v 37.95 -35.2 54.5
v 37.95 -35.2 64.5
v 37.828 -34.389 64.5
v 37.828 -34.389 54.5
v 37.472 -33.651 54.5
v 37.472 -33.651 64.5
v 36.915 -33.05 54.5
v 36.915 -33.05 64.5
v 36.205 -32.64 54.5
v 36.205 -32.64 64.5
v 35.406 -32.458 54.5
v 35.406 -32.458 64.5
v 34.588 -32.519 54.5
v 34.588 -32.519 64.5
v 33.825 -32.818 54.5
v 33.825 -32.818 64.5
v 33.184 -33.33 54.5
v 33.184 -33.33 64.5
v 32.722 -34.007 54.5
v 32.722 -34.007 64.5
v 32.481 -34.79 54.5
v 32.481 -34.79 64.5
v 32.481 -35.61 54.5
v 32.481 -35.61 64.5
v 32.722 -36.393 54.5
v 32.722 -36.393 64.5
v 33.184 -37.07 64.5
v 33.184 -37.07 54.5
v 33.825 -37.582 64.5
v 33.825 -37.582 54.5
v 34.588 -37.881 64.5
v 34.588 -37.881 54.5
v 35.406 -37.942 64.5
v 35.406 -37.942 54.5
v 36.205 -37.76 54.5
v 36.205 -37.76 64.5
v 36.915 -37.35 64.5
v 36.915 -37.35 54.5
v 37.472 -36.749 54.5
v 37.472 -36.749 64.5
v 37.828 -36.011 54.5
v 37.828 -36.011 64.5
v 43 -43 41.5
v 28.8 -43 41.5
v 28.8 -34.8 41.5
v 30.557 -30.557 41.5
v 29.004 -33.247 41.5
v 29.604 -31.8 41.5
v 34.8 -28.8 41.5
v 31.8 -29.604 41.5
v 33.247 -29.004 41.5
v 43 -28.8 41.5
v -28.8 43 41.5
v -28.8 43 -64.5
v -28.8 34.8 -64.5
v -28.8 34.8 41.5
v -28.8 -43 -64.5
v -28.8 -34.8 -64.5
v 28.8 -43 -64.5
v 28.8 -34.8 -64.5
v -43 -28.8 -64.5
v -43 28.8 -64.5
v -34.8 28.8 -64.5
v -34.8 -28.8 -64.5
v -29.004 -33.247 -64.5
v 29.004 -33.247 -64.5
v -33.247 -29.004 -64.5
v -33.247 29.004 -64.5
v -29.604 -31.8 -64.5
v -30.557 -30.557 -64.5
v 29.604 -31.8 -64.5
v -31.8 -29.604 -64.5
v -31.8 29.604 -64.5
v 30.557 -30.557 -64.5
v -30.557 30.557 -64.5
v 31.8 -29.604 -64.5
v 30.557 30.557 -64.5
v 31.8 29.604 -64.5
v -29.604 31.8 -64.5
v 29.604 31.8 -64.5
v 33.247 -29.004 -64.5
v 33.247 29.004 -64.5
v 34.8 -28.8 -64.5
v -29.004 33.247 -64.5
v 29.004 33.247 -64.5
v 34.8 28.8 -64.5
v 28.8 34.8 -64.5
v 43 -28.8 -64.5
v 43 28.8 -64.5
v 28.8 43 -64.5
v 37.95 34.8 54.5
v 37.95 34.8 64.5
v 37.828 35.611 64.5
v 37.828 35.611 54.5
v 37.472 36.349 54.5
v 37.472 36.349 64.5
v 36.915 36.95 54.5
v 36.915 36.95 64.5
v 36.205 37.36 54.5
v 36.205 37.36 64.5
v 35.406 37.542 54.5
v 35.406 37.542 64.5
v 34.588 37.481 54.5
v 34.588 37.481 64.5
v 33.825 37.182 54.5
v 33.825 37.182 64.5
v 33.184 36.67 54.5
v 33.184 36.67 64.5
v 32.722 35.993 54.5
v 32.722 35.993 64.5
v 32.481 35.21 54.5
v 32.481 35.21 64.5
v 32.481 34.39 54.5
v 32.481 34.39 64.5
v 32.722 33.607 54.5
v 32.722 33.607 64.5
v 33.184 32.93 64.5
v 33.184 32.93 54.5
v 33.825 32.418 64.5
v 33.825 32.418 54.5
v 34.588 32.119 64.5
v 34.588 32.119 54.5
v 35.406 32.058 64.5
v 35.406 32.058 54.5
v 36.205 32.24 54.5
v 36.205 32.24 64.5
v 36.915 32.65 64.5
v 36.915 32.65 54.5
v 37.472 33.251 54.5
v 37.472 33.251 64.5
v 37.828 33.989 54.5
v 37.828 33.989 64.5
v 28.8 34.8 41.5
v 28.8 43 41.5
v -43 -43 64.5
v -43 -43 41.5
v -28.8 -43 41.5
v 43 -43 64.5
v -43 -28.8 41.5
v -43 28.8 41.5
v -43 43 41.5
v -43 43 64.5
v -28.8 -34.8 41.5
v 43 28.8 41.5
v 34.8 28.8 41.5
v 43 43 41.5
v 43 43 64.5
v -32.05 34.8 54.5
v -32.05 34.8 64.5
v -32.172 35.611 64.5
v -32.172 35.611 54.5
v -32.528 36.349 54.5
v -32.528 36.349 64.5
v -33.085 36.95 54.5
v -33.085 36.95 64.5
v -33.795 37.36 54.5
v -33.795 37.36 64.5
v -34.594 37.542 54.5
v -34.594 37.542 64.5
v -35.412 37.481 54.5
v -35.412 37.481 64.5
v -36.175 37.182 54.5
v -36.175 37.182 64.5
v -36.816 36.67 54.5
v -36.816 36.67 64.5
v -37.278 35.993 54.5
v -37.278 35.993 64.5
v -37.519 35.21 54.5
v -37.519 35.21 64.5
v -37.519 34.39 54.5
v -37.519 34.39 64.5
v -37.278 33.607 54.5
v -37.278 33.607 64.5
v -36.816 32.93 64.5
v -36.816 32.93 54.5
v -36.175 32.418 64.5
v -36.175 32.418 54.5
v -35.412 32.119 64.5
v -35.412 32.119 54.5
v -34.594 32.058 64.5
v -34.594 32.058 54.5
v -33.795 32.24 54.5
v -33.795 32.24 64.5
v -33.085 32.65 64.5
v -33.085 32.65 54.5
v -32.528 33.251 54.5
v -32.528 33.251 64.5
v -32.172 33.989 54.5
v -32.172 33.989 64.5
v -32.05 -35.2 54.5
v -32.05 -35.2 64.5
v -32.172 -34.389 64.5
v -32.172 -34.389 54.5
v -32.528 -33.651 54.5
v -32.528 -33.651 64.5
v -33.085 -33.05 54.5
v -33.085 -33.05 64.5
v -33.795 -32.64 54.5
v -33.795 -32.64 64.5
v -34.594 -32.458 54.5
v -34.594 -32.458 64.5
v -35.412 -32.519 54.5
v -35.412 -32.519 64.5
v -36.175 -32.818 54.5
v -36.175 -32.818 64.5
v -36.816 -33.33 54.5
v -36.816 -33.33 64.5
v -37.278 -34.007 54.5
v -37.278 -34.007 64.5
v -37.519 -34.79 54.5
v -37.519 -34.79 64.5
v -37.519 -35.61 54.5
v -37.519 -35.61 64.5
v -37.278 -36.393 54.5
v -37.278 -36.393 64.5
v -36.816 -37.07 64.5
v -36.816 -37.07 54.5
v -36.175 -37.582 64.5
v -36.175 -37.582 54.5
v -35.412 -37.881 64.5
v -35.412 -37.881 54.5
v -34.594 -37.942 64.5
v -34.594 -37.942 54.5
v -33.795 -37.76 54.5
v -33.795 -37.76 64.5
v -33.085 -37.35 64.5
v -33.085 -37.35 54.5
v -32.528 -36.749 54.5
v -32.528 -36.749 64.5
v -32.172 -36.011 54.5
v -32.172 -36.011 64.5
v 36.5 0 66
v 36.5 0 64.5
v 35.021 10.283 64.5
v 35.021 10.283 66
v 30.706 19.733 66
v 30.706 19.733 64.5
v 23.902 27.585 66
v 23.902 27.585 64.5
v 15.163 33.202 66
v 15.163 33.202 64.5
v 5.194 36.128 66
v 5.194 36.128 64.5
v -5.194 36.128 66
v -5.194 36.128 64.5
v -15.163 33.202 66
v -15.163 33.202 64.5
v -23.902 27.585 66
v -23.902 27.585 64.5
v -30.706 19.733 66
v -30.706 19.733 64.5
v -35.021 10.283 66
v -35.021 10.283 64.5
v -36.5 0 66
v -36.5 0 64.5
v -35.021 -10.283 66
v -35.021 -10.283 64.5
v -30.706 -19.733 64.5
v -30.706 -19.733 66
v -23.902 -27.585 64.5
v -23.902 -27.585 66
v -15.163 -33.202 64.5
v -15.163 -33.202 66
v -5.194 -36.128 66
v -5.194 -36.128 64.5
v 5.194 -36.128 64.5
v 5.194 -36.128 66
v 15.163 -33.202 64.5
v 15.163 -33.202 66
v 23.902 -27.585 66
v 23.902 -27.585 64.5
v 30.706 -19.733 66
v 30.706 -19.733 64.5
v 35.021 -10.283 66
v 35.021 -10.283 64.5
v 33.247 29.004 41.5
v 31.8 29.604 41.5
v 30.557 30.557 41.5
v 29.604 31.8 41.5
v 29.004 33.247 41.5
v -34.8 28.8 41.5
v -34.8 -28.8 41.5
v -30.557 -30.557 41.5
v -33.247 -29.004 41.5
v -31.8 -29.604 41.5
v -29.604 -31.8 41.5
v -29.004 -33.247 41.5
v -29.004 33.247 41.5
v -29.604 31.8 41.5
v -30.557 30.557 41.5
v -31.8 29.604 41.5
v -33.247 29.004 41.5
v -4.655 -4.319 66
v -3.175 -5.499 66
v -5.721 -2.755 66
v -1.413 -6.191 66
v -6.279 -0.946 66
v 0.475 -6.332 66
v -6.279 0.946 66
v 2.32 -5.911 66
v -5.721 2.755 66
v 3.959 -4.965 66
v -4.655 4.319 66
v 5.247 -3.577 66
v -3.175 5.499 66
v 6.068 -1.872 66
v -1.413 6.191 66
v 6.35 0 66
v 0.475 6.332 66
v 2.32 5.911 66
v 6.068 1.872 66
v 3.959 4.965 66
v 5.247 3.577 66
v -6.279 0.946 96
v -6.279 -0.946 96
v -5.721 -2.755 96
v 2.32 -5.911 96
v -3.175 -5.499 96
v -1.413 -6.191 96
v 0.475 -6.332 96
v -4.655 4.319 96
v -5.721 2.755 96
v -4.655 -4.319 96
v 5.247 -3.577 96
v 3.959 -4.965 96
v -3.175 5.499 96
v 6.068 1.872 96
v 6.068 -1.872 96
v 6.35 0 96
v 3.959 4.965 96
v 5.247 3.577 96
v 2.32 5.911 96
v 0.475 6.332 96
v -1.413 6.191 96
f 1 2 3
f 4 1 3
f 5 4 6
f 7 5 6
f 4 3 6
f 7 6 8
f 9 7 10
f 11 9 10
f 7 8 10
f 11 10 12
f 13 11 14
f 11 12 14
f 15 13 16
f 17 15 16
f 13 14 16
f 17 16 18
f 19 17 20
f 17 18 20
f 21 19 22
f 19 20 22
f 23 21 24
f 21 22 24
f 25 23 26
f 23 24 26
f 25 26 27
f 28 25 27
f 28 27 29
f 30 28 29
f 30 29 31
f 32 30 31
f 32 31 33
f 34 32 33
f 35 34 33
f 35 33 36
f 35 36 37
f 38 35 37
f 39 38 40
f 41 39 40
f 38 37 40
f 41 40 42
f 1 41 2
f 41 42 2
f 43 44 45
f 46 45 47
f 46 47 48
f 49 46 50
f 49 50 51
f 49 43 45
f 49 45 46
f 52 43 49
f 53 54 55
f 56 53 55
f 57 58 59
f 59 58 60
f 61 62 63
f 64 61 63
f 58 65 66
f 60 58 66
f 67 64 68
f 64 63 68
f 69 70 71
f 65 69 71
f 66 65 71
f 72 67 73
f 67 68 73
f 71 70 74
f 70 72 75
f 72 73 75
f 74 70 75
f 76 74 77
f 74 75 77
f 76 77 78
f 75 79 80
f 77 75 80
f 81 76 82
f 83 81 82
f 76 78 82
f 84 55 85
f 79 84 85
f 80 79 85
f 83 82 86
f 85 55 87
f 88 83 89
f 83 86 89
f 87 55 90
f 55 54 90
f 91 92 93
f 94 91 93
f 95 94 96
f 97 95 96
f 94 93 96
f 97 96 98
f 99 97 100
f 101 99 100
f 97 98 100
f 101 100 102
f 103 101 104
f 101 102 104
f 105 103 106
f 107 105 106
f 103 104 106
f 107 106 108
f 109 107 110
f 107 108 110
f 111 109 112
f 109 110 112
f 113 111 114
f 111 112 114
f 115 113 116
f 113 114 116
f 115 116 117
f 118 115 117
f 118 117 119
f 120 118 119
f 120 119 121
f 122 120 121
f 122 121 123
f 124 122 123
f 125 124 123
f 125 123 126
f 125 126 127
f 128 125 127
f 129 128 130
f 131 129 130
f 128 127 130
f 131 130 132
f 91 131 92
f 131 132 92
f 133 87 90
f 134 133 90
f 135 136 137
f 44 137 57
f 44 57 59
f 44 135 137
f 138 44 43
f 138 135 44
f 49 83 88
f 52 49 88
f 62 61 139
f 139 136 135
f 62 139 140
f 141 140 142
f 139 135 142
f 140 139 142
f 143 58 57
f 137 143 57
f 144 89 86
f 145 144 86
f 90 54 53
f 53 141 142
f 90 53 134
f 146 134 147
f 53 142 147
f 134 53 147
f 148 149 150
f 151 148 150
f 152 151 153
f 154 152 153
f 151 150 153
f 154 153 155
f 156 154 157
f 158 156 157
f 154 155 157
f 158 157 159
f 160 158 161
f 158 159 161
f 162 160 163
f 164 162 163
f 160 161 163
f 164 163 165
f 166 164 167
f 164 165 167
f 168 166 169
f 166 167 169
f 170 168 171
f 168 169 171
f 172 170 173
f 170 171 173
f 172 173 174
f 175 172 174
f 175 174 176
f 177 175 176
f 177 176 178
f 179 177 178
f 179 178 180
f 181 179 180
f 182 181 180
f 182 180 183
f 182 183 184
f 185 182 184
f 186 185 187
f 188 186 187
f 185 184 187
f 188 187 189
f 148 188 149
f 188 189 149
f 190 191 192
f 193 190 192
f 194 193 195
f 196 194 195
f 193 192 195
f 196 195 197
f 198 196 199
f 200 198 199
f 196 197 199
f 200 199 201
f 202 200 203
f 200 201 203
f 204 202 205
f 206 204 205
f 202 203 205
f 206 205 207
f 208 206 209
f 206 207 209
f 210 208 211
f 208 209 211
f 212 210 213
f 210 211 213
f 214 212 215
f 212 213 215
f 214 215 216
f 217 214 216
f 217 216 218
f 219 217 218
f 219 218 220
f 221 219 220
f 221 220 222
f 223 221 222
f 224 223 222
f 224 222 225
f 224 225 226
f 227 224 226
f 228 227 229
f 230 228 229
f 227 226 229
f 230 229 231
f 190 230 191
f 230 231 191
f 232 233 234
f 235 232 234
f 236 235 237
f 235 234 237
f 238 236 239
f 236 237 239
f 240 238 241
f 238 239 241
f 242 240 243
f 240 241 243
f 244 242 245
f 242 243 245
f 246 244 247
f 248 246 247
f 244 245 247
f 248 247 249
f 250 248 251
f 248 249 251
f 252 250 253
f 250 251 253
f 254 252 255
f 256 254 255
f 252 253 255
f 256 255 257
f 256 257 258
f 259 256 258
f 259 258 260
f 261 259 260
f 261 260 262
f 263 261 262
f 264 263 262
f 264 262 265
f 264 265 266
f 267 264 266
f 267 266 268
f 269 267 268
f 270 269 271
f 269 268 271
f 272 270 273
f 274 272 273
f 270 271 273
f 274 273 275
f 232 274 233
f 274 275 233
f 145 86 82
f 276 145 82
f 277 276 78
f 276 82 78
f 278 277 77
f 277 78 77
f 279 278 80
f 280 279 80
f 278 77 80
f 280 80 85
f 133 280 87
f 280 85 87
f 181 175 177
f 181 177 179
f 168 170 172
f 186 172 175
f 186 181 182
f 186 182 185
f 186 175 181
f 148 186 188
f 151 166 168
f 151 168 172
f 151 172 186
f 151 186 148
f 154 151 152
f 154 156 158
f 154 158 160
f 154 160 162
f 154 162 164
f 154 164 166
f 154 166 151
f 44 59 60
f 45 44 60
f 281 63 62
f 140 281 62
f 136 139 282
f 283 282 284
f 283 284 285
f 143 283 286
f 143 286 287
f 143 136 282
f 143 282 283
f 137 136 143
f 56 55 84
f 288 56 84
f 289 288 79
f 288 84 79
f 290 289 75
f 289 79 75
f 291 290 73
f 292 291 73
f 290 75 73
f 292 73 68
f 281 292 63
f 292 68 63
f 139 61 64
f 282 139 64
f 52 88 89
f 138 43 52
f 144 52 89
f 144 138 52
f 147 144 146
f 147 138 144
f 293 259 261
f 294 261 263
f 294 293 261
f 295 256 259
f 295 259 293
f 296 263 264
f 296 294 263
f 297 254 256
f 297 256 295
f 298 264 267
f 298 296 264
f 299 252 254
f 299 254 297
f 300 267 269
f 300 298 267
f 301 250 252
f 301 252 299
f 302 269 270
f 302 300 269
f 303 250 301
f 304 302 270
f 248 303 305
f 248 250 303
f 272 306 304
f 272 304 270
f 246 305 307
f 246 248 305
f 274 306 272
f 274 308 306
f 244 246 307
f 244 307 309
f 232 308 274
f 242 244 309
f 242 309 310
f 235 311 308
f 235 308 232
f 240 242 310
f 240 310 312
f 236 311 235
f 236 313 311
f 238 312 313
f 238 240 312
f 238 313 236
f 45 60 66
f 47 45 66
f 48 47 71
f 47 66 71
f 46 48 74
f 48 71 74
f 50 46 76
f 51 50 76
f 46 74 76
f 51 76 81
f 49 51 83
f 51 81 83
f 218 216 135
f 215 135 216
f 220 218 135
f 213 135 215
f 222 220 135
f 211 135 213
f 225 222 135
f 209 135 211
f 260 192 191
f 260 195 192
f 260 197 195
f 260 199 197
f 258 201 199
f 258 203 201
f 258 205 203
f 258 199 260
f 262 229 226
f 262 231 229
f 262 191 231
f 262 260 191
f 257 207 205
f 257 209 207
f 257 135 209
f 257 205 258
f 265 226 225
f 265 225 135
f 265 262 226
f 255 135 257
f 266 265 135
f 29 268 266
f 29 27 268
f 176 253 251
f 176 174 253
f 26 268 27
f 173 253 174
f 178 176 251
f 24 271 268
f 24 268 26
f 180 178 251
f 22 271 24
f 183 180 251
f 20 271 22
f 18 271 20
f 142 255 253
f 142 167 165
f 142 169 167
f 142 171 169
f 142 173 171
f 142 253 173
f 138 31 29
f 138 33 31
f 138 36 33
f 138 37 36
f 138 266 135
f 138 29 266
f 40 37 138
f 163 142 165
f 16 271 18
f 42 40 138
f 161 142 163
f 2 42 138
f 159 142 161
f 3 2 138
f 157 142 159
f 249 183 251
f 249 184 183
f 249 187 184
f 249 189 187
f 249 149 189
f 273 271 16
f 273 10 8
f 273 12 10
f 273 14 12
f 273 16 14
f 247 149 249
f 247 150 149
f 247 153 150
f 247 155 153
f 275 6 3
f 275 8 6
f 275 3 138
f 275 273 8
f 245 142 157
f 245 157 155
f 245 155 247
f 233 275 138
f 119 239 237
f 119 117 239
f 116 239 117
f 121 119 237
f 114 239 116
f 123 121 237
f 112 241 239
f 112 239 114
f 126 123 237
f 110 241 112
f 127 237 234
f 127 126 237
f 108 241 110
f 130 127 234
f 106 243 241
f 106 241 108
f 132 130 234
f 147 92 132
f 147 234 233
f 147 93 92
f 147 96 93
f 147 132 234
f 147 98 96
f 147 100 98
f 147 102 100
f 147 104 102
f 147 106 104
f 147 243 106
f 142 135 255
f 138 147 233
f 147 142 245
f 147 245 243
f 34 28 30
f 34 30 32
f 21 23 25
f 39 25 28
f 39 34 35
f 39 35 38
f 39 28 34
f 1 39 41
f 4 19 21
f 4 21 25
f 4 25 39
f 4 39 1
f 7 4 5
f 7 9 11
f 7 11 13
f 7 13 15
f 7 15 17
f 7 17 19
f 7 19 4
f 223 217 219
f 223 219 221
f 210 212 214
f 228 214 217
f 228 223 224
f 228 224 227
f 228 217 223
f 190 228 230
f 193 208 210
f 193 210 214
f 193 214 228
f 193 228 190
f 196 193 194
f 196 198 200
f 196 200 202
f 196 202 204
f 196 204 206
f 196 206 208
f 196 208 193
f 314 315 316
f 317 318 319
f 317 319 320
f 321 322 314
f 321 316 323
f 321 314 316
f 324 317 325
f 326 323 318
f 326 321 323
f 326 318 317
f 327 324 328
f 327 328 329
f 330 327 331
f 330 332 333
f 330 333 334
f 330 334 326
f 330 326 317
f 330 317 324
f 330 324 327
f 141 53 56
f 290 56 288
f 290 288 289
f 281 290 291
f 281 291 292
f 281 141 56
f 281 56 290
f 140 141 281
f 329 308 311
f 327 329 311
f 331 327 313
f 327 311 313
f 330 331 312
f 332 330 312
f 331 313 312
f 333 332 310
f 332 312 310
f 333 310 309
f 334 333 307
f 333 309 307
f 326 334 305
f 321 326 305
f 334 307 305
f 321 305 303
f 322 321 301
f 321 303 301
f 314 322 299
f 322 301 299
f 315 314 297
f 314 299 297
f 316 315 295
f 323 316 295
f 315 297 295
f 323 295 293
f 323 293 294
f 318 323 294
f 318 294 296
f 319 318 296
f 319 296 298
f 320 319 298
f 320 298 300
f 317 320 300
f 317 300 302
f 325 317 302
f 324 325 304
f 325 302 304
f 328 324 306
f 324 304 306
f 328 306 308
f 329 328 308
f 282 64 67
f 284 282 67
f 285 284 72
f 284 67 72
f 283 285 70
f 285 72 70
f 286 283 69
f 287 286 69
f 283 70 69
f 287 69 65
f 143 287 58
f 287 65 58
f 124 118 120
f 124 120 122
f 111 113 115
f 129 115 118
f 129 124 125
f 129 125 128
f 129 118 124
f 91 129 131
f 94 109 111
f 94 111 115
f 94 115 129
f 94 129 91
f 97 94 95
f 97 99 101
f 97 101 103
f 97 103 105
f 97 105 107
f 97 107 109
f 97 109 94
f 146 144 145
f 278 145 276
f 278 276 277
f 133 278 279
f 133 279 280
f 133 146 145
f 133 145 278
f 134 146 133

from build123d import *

# Parameters (mm, degrees)
SKETCH_3_W               = 86
SKETCH_3_H               = 86
EXTRUDE_2_DEPTH          = 64.5
CUT_EXTRUDE_2_DEPTH      = 106
PATTERN_CIRCULAR_1_COUNT = 4
SKETCH_5_R               = 2.75
CUT_EXTRUDE_3_DEPTH      = 10
SKETCH_6_R               = 36.5
EXTRUDE_3_DEPTH          = 1.5
SKETCH_7_R               = 6.35
EXTRUDE_4_DEPTH          = 30


with BuildPart() as part:
    # 草图3 → 凸台-拉伸2 (new, symmetric)
    with BuildSketch(Plane.XY):
        Rectangle(SKETCH_3_W, SKETCH_3_H)
    extrude(amount=EXTRUDE_2_DEPTH, both=True)

    # 草图4 → 切除-拉伸2 (cut)
    with BuildSketch(Plane(origin=(0, 0, -64.5), x_dir=(-1, 0, 0), z_dir=(0, 0, -1))):
        with BuildLine():
            Line((-28.8, 34.8), (-28.8, 43))
            Line((-28.8, 43), (-43, 43))
            Line((-43, 43), (-43, 28.8))
            Line((-43, 28.8), (-34.8, 28.8))
            ThreePointArc((-34.8, 28.8), (-30.557359313, 30.557359313), (-28.8, 34.8))
        make_face()
    cut_extrude_2 = extrude(amount=-CUT_EXTRUDE_2_DEPTH, mode=Mode.SUBTRACT)

    # 阵列(圆周)1: 切除-拉伸2 ×4 about axis
    pattern_circular_1_axis = Axis((0, 0, -44), (0, 0, 1))
    for i in range(1, PATTERN_CIRCULAR_1_COUNT):
        add(cut_extrude_2.rotate(pattern_circular_1_axis, i * 360 / PATTERN_CIRCULAR_1_COUNT), mode=Mode.SUBTRACT)

    # 草图5 → 切除-拉伸3 (cut)
    with BuildSketch(Plane.XY.offset(64.5)):
        with Locations((-34.8, 34.8)):
            Circle(SKETCH_5_R)
        with Locations((35.2, 34.8)):
            Circle(SKETCH_5_R)
        with Locations((35.2, -35.2)):
            Circle(SKETCH_5_R)
        with Locations((-34.8, -35.2)):
            Circle(SKETCH_5_R)
    extrude(amount=-CUT_EXTRUDE_3_DEPTH, mode=Mode.SUBTRACT)

    # 草图6 → 凸台-拉伸3 (add)
    with BuildSketch(Plane.XY.offset(64.5)):
        Circle(SKETCH_6_R)
    extrude(amount=EXTRUDE_3_DEPTH)

    # 草图7 → 凸台-拉伸4 (add)
    with BuildSketch(Plane.XY.offset(66)):
        Circle(SKETCH_7_R)
    extrude(amount=EXTRUDE_4_DEPTH)


solid = part.part
